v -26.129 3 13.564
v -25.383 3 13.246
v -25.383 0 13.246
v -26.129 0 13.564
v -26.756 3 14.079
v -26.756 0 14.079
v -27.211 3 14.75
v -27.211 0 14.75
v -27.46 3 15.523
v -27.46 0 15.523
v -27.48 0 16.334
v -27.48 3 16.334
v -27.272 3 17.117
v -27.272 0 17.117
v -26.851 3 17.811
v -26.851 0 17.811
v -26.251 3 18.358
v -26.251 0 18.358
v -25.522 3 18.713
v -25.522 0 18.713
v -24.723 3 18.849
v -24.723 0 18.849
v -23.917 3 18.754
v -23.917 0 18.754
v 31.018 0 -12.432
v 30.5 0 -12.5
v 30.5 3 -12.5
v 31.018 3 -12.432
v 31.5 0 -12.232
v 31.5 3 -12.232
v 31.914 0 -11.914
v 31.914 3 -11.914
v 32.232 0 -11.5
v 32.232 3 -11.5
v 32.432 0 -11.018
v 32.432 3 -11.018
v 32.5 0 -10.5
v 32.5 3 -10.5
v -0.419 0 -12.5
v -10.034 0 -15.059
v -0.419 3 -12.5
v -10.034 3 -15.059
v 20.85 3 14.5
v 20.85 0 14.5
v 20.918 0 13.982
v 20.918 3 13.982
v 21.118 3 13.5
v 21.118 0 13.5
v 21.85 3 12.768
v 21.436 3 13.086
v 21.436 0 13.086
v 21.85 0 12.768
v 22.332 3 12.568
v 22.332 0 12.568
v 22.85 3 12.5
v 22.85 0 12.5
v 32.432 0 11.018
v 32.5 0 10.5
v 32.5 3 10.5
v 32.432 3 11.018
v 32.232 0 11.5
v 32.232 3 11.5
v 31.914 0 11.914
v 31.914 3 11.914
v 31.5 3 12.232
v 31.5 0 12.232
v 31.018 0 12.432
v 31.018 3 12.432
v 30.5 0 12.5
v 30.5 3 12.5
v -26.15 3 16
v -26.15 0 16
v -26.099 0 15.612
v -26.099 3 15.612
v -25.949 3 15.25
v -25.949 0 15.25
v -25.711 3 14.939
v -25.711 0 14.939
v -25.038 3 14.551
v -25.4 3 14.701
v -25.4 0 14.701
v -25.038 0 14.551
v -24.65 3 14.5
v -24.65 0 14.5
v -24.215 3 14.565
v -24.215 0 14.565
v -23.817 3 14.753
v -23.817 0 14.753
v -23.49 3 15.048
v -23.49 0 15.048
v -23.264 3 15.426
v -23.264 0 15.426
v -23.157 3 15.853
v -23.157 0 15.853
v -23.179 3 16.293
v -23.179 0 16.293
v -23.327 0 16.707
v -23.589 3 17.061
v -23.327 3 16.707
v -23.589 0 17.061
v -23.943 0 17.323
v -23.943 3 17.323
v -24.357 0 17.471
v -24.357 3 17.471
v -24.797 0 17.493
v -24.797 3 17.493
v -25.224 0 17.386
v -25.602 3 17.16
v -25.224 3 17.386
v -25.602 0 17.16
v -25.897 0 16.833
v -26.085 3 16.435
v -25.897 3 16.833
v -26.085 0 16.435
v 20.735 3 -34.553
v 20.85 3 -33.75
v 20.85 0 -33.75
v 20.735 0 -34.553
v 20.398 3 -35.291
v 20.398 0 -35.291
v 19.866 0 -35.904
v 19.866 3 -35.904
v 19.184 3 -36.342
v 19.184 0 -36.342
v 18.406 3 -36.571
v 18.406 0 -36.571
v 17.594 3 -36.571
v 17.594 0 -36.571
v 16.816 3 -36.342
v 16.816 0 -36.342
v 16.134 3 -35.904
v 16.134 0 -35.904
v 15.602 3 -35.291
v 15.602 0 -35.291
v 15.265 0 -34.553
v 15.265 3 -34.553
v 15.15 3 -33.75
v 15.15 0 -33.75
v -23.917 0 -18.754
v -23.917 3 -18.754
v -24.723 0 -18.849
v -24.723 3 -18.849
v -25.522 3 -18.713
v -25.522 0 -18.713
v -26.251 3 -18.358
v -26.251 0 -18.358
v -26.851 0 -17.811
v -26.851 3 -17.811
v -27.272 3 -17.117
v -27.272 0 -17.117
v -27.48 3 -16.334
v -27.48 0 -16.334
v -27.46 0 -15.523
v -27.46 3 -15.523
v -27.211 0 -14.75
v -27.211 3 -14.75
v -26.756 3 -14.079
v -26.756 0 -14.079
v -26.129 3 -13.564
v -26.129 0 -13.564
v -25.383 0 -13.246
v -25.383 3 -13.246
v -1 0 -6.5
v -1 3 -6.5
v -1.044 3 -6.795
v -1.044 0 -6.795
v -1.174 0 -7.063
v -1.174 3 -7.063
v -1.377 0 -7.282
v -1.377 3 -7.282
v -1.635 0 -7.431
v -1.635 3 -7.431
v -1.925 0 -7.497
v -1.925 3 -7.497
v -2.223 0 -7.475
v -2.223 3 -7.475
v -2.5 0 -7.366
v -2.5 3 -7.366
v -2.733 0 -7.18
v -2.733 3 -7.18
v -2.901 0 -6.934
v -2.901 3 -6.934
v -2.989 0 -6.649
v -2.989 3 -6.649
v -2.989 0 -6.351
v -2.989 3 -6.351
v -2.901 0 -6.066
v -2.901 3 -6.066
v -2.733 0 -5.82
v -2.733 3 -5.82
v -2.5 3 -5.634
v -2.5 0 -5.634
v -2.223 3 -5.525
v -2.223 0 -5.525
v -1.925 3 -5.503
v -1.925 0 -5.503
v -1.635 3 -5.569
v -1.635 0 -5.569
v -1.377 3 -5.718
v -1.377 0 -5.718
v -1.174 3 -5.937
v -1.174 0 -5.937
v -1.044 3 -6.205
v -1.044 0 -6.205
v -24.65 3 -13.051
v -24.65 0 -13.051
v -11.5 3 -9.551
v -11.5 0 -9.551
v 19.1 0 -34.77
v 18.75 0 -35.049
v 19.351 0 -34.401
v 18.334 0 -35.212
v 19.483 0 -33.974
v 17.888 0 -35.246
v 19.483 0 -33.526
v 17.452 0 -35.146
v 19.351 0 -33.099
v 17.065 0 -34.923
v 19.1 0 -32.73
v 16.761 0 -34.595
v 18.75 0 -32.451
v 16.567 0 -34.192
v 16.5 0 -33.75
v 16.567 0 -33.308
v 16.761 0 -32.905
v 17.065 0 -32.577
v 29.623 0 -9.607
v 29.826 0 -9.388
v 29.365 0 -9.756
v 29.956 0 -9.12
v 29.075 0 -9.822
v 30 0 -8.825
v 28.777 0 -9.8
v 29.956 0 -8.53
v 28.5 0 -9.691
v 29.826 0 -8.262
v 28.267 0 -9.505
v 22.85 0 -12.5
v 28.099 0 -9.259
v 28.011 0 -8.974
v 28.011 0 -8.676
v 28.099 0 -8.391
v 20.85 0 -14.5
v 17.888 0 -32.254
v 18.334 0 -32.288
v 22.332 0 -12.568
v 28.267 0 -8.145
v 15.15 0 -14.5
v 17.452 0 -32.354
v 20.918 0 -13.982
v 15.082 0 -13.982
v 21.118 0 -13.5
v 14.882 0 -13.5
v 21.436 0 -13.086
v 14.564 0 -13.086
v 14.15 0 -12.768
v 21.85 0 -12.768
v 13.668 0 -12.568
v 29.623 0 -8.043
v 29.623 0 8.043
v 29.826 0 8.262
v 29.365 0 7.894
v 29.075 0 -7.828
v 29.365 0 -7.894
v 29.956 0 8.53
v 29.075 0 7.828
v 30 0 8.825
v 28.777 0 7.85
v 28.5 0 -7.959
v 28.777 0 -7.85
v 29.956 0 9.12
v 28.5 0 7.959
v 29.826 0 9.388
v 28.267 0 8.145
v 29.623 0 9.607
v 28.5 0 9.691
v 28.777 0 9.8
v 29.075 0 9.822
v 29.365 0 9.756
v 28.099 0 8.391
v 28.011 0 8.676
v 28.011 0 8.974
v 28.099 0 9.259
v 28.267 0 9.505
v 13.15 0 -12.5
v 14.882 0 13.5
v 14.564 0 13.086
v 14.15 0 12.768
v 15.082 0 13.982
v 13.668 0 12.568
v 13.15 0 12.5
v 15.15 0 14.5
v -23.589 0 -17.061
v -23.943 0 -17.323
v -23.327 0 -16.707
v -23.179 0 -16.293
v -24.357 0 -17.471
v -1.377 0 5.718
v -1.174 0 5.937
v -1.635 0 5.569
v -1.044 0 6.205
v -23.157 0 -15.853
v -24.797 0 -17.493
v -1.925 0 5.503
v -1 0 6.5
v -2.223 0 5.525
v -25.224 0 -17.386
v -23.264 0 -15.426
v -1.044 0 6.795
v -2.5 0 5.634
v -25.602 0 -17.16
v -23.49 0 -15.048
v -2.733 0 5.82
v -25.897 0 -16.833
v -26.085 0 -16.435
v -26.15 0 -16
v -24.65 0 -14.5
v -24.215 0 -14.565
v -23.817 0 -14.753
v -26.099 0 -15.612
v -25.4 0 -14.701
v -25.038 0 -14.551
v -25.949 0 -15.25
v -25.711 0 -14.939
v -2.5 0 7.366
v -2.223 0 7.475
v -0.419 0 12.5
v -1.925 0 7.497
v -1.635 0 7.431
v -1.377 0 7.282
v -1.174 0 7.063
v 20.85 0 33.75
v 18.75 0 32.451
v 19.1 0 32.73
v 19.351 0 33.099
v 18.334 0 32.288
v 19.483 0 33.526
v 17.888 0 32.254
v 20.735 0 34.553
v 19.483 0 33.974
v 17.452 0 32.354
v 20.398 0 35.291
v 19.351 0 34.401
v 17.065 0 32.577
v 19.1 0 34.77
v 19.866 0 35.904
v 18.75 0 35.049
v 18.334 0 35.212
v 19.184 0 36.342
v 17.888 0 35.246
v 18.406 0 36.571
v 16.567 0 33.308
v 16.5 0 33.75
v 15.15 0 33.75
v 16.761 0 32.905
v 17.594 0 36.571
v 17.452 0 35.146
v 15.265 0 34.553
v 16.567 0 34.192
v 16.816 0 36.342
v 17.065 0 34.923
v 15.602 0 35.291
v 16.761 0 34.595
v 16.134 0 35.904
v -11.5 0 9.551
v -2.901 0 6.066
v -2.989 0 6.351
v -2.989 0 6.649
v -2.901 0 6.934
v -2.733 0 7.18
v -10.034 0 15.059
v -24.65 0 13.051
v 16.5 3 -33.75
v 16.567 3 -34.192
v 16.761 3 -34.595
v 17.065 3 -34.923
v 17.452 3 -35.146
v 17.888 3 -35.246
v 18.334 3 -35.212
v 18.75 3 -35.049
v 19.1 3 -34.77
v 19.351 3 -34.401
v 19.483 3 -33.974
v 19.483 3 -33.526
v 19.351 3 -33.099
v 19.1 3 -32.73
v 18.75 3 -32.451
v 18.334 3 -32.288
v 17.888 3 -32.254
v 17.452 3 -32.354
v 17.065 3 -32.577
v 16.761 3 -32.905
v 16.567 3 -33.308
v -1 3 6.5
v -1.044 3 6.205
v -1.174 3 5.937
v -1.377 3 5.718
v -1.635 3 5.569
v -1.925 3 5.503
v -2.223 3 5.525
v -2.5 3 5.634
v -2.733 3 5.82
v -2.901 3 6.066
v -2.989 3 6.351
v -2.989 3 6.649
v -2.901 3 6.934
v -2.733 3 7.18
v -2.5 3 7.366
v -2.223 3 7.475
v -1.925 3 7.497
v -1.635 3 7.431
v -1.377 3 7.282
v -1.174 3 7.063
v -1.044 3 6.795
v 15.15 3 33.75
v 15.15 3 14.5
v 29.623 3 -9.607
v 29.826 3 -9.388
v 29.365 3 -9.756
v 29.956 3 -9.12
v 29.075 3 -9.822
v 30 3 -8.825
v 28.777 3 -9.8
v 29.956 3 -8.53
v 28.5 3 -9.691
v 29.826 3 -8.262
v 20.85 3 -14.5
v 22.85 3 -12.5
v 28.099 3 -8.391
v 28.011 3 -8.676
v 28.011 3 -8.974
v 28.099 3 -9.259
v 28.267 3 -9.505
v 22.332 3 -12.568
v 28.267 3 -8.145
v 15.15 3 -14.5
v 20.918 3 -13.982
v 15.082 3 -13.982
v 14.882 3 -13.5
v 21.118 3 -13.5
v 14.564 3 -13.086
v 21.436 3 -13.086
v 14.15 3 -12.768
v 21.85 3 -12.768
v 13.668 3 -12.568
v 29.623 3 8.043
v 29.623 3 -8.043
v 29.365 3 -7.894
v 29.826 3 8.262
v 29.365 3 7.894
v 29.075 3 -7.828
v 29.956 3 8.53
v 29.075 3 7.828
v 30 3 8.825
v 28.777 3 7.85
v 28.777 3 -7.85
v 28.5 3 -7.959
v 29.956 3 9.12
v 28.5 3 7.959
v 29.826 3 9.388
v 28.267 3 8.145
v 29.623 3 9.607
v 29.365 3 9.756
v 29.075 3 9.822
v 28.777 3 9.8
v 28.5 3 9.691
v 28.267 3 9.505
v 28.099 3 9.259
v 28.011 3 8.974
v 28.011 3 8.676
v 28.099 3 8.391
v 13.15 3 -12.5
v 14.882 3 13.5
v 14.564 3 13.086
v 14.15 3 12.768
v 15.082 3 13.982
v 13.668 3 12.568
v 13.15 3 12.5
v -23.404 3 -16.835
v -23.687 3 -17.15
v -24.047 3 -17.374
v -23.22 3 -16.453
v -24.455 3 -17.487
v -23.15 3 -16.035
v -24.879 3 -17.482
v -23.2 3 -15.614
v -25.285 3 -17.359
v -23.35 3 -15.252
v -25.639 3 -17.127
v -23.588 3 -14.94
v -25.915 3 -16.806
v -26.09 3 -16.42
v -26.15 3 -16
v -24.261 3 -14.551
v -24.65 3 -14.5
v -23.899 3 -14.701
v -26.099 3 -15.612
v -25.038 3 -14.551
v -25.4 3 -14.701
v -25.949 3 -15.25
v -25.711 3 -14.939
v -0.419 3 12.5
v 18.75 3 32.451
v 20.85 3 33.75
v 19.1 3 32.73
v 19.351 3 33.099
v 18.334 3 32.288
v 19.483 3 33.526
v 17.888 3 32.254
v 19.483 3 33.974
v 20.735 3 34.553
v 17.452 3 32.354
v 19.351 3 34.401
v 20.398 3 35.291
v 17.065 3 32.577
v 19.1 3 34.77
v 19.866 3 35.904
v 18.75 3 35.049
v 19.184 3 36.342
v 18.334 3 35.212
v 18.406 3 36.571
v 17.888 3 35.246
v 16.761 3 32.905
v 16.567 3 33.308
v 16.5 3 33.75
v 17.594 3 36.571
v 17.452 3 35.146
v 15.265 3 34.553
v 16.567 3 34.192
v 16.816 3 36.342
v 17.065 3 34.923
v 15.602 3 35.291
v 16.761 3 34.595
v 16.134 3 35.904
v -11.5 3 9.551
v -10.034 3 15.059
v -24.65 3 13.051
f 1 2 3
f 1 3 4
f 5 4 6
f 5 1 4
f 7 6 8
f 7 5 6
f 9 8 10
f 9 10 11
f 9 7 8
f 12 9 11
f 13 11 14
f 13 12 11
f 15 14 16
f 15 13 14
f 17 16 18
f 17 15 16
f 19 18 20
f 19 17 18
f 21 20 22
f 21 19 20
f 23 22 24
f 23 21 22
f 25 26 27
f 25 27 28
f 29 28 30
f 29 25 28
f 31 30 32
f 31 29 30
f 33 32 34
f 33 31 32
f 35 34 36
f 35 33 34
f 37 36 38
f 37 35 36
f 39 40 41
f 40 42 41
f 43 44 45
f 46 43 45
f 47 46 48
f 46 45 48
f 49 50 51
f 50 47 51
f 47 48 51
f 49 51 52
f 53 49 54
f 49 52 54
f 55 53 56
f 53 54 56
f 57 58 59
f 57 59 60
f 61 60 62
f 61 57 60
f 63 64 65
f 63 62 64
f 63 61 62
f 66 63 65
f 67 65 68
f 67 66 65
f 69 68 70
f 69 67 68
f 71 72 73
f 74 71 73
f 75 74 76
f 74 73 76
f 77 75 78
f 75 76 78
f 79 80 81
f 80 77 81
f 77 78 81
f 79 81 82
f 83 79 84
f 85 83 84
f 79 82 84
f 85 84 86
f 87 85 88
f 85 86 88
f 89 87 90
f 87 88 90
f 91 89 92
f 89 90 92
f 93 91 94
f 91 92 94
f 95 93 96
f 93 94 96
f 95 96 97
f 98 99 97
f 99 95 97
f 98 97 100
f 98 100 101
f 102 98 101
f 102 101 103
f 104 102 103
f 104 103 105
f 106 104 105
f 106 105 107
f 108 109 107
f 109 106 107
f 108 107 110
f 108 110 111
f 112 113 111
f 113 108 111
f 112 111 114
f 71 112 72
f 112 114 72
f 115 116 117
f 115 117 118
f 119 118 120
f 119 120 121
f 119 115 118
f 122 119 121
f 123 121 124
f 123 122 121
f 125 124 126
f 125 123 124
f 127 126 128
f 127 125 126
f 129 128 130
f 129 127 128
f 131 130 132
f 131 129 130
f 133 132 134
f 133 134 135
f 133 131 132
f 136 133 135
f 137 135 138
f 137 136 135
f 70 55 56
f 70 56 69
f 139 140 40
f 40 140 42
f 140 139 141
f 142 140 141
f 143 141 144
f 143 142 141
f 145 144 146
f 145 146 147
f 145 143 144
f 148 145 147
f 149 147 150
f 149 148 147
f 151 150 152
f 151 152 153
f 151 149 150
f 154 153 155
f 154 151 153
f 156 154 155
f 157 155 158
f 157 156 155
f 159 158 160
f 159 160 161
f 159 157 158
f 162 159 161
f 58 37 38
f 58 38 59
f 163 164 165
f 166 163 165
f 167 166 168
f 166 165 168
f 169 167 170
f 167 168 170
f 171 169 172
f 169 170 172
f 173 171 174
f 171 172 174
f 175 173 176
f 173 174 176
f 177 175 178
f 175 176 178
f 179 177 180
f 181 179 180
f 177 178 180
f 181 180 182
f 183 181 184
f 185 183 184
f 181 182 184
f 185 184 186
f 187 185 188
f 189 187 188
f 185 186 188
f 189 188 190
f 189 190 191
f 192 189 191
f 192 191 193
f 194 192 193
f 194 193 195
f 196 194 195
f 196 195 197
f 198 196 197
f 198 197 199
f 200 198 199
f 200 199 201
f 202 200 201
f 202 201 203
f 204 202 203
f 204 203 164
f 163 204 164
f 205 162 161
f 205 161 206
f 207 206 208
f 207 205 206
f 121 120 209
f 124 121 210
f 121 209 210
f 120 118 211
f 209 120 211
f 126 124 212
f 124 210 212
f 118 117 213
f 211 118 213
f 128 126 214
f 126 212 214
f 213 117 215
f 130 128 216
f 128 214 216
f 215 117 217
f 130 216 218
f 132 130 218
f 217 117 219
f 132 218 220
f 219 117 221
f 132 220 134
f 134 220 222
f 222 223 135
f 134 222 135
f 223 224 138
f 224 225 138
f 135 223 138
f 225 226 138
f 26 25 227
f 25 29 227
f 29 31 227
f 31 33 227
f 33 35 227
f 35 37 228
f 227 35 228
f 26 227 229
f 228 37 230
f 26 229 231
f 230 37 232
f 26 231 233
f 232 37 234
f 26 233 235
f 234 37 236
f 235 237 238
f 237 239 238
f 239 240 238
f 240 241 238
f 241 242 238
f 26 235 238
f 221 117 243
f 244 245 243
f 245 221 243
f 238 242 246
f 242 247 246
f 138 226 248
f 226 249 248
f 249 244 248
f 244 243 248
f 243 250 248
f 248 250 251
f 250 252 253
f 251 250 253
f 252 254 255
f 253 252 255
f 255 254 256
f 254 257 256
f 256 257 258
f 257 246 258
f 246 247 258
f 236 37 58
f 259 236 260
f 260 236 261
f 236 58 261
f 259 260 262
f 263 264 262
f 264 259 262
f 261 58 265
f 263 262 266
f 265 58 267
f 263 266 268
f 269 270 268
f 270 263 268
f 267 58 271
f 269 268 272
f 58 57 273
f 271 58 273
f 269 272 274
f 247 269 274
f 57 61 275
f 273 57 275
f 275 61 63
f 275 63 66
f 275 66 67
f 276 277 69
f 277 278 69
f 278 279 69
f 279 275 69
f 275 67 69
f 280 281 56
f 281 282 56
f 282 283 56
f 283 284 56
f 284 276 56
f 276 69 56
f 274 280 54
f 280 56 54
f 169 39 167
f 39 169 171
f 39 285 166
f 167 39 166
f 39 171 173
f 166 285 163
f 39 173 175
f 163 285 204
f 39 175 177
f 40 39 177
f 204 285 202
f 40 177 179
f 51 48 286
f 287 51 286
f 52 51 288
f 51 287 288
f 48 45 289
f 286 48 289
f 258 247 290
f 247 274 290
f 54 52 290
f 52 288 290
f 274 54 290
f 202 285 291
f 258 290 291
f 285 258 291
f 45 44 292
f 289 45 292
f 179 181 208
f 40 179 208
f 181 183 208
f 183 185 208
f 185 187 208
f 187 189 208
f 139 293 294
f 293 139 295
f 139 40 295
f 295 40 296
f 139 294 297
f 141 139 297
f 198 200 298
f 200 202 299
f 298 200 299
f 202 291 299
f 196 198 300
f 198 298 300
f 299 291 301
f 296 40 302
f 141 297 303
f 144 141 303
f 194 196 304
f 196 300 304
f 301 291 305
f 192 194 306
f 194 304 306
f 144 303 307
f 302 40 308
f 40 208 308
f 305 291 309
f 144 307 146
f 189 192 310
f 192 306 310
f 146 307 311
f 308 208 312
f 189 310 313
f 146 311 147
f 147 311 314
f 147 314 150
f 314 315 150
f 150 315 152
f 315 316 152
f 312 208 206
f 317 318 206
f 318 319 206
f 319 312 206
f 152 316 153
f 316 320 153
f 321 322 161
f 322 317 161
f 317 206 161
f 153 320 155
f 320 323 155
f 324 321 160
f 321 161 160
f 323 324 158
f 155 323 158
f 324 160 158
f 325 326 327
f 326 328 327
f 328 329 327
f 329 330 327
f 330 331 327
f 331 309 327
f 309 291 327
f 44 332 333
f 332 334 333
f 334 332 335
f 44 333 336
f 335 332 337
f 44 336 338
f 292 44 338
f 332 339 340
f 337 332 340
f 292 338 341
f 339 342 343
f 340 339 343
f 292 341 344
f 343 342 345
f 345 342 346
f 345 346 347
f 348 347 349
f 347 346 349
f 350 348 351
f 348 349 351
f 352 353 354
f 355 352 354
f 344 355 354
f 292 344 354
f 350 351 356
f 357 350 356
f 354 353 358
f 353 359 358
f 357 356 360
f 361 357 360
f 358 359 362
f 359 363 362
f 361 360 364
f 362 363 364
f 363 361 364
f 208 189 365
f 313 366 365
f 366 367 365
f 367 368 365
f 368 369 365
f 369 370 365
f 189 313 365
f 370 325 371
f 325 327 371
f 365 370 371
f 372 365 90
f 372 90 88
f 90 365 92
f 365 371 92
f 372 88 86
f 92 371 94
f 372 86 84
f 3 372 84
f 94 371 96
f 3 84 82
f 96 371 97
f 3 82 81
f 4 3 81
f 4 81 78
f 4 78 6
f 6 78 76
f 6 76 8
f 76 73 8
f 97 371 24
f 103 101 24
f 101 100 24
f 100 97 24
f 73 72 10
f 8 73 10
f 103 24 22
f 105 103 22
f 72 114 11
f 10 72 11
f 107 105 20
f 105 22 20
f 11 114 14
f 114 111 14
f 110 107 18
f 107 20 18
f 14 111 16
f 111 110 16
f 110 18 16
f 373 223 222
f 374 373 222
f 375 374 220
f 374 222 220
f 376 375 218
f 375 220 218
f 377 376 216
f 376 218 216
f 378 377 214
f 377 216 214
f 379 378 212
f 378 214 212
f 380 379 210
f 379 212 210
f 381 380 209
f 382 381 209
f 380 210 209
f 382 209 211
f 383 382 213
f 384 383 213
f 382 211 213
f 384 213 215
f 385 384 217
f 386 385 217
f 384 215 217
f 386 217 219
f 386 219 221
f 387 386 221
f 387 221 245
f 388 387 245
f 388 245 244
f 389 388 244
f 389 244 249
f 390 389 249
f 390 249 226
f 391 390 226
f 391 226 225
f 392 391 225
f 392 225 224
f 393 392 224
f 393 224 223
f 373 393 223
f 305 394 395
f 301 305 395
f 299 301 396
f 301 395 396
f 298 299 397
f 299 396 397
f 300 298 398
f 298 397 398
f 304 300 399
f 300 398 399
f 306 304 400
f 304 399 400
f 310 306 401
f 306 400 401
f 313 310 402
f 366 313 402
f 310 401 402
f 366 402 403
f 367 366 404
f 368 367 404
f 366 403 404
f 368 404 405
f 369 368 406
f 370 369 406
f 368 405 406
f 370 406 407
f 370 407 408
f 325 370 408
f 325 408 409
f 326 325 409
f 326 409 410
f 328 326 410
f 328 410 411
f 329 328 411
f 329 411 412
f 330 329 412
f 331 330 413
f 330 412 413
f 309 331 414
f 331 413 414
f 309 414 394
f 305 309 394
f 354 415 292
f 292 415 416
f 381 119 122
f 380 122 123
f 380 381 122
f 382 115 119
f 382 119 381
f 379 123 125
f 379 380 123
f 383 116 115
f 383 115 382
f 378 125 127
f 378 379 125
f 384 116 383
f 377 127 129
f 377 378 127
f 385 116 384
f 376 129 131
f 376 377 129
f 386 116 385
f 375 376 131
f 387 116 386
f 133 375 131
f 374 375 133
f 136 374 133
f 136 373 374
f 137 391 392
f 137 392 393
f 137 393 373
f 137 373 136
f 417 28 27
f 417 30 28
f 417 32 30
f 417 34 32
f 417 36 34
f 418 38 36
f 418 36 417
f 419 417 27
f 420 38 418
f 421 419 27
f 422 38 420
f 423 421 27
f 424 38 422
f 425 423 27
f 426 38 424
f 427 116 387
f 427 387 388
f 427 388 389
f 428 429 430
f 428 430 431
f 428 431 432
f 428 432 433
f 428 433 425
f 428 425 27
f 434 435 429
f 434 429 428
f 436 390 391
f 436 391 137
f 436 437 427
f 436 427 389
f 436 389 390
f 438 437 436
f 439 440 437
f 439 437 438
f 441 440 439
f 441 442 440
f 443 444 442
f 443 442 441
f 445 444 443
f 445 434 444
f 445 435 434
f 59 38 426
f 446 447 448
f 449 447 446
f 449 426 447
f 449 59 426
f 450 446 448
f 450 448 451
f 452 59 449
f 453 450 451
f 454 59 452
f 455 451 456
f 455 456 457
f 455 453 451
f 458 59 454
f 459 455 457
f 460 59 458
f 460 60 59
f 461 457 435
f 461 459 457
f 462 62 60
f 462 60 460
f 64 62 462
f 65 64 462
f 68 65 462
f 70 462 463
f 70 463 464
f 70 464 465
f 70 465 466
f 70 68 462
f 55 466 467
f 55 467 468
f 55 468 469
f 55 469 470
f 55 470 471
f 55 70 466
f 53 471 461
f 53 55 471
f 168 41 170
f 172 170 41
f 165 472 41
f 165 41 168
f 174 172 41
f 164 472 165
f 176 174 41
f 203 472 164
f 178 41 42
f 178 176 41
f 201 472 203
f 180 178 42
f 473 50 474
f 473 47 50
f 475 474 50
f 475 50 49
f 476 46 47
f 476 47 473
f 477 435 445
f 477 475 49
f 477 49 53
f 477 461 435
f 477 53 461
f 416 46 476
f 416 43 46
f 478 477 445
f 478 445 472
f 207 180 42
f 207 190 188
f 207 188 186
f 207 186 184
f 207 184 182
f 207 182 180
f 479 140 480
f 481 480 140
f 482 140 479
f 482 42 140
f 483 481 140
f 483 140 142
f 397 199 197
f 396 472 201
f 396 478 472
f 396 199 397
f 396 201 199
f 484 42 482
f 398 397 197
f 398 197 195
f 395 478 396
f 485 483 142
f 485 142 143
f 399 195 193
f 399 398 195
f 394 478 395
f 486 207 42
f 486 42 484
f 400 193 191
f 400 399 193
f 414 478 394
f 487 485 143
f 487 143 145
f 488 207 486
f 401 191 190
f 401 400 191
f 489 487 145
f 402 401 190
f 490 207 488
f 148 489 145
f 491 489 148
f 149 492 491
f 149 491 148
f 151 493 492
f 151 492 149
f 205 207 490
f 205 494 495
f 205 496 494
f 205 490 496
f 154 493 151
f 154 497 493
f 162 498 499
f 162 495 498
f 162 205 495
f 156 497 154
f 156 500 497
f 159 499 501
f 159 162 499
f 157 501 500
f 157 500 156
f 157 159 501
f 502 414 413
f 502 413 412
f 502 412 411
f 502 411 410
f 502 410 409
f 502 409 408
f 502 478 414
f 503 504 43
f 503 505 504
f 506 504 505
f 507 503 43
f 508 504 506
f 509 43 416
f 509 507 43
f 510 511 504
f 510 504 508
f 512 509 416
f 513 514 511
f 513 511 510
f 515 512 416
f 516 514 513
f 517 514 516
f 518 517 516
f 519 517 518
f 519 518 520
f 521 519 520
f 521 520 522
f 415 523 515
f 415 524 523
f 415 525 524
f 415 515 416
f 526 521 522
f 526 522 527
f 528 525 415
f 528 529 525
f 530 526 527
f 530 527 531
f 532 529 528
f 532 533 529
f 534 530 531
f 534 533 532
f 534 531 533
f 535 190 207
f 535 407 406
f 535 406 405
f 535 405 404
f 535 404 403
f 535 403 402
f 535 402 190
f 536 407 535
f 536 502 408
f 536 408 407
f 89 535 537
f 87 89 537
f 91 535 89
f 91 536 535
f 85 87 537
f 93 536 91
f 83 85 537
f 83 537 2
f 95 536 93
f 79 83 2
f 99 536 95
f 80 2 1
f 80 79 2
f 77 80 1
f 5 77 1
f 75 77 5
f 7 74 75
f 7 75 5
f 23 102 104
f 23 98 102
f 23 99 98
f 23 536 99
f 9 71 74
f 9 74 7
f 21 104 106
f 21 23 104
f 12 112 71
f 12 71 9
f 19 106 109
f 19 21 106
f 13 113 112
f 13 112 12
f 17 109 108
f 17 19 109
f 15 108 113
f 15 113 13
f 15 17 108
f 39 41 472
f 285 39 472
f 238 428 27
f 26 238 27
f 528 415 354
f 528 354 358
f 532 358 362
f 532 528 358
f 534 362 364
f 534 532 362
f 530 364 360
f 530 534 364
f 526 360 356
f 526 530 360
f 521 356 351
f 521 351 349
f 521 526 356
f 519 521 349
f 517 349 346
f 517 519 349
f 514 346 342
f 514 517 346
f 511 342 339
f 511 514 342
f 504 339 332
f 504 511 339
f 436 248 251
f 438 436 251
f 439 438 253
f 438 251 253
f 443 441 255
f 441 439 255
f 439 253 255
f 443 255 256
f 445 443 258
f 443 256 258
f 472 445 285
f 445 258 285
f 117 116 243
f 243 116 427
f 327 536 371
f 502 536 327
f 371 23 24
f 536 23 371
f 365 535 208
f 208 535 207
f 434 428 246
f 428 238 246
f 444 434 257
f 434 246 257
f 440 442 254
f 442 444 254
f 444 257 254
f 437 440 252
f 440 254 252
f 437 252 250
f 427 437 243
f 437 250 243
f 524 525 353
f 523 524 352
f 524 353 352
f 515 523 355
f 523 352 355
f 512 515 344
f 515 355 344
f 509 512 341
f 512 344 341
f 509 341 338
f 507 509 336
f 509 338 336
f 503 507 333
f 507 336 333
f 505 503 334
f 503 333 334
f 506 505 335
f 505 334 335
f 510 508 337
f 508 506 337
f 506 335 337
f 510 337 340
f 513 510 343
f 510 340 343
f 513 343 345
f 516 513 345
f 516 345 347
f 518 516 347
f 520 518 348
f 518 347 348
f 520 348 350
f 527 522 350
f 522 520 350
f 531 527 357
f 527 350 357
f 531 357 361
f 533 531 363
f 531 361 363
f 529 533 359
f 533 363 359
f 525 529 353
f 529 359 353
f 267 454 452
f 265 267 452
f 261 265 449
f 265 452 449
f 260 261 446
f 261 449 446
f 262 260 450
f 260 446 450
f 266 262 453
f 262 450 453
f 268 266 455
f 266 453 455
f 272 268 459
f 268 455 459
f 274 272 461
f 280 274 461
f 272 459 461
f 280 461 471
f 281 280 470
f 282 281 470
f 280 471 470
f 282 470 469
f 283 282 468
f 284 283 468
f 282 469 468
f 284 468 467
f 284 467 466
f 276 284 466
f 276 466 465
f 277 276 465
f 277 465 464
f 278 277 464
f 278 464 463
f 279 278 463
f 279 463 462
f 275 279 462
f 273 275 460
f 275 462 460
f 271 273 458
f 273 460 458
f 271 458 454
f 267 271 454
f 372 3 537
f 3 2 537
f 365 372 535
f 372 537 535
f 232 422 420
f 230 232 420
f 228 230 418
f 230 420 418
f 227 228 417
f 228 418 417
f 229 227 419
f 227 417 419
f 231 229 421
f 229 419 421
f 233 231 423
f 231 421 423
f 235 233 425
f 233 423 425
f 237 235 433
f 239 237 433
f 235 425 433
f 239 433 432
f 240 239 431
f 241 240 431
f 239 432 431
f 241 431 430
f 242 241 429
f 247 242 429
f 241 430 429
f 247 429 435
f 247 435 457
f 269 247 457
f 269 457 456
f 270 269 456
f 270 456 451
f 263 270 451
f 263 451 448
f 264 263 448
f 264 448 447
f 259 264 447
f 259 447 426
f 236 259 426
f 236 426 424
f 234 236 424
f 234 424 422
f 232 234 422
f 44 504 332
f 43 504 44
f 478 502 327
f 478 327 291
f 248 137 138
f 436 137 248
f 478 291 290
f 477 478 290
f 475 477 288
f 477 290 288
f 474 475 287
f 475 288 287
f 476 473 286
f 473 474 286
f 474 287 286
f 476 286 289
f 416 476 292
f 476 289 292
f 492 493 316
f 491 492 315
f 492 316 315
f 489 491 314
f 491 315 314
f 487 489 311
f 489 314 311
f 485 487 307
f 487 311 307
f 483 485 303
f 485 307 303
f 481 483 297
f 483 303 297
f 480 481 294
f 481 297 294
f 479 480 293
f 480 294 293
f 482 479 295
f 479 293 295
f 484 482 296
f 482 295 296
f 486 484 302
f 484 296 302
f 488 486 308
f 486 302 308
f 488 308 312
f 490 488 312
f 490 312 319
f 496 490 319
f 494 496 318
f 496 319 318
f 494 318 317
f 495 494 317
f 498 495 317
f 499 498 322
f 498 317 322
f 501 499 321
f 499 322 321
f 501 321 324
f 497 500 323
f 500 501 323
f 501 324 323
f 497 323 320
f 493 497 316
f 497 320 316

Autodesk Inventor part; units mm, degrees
ref_plane "YZ Plane" through (0, 0, 0) normal (1, 0, 0) x (0, 1, 0)
ref_plane "XZ Plane" through (0, 0, 0) normal (0, 1, 0) x (-1, 0, 0)
sketch "Sketch1" plane through (0, 0, 0) normal (0, 1, 0) x (-1, 0, 0)
  line L0 (-29, 33.75) -> (29, 33.75)
  line L1 (29, 33.75) -> (29, -33.75)
  line L2 (29, -33.75) -> (-29, -33.75)
  line L3 (-29, -33.75) -> (-29, 33.75)
  line L4 (-29, 33.75) -> (29, -33.75) construction
  line L5 (29, 33.75) -> (-29, -33.75) construction
  line L6 (-32.5, 37.25) -> (32.5, 37.25)
  line L7 (32.5, -37.25) -> (-32.5, -37.25)
  line L8 (-32.5, -37.25) -> (-32.5, 37.25)
  line L9 (-32.5, 37.25) -> (32.5, -37.25) construction
  line L10 (32.5, 37.25) -> (-32.5, -37.25) construction
  line L11 (32.5, 37.25) -> (32.5, 5.9791)
  line L12 (32.5, -5.9791) -> (32.5, -37.25)
  line L13 (24.65, -1.5966) -> (24.65, -16)
  circle A0 centre (24.65, -16) radius 1.5
  arc A1 (32.5, 5.9791) -> (32.5, -5.9791) centre (33, 0) ccw
  line L14 (32.5, -5.9791) -> (32.5, 5.9791)
  line L15 (33, 0) -> (-32.5, 0)
  line L16 (24.65, -1.5966) -> (24.65, 16)
  circle A2 centre (24.65, 16) radius 1.5
  circle A3 centre (-18, -33.75) radius 1.5
  circle A4 centre (-18, 33.75) radius 1.5
  point P0 (0, 0)
  dimension "d1" = 58
  dimension "d3" = 3.5
  dimension "d31" = 67.5
  dimension "d32" = 3.5
  dimension "d34" = 3
  dimension "d57" = 47
  dimension "d61" = 42.65
  dimension "d62" = 16
ref_plane "Work Plane1" through (0, 3, 0) normal (0, 1, 0) x (1, 0, 0)
extrude "Extrusion4" add sketch "Sketch1" along normal blind 3 contours A4 L0 L3 L15 L8 L6 L11 A1 L1 | L0 L1 A1 L15 L3 A4 | A1 L1 L2 A3 L3 L15 | L3 L2 A3 L1 A1 L12 L7 L8 L15
sketch "Sketch3" plane through (0, 3, 0) normal (0, 1, 0) x (1, 0, 0)
  circle A0 centre (-24.65, 16) radius 1.5 projected
  circle A1 centre (-24.65, 16) radius 2.85
  circle A2 centre (18, 33.75) radius 1.5
  line L0 (32.5, -37.25) -> (32.5, 37.25) projected
  line L1 (32.5, 0) -> (-11.5, 0)
  line L2 (-11.5, 0) -> (-11.5, 12.5)
  line L3 (-11.5, 12.5) -> (32.5, 12.5)
  line L4 (32.5, 12.5) -> (32.5, 0)
  line L5 (32.5, 0) -> (32.5, 12.5)
  line L6 (32.5, 0) -> (29, 0)
  line L7 (29, 0) -> (29, 8.825)
  line L8 (29, 8.825) -> (-2, 8.825)
  line L9 (-2, 8.825) -> (-2, 0)
  circle A3 centre (29, 8.825) radius 1
  line L10 (-11.5, 0) -> (-11.5, -12.5)
  line L11 (-11.5, -12.5) -> (32.5, -12.5)
  line L12 (32.5, -12.5) -> (32.5, 0)
  line L13 (29, 0) -> (29, -8.825)
  line L14 (29, -8.825) -> (-2, -8.825)
  line L15 (-2, -8.825) -> (-2, 0)
  circle A4 centre (29, -8.825) radius 1
  line L16 (32.5, 26) -> (32.5, 12.5)
  line L17 (-24.65, 16) -> (-11.5, 12.5)
  line L18 (-25.383, 13.2459) -> (-11.5, 9.5508)
  line L19 (-23.917, 18.7541) -> (-10.0339, 15.059)
  line L20 (32.5, 26) -> (32.5, 12.5)
  line L21 (-10.0339, 15.059) -> (-0.4194, 12.5)
  circle A5 centre (-24.65, -16) radius 2.85
  line L22 (-24.65, -16) -> (-11.5, -12.5)
  line L23 (-25.383, -13.2459) -> (-11.5, -9.5508)
  line L24 (-23.917, -18.7541) -> (-10.0339, -15.059)
  line L25 (-10.0339, -15.059) -> (-0.4194, -12.5)
  circle A6 centre (18, 33.75) radius 2.85
  line L26 (32.5, 12.5) -> (15.5, 12.5)
  circle A7 centre (-2, 6.5) radius 1
  circle A8 centre (-2, -6.5) radius 1
  circle A9 centre (18, 33.75) radius 1.5 projected
  circle A10 centre (18, -33.75) radius 1.5
  circle A11 centre (18, -33.75) radius 2.85
  circle A12 centre (18, -33.75) radius 1.5
  line L27 (20.85, 33.75) -> (20.85, 12.5)
  line L28 (15.15, 33.75) -> (15.15, 12.5)
  line L29 (20.85, -33.75) -> (20.85, -12.5)
  line L30 (15.15, -33.75) -> (15.15, -12.5)
  point P0 (0, 0)
  point P1 (-23.917, 18.7541)
  point P2 (-11.5, -9.5508)
  point P3 (-23.917, -18.7541)
  point P4 (-0.4194, -12.5)
  point P5 (32.5, -12.5)
  point P6 (15.15, -12.5)
  point P7 (20.85, -33.75)
  point P8 (20.85, -12.5)
  point P9 (15.15, 12.5)
  point P10 (20.85, 12.5)
  dimension "d37" = 5.7
  dimension "d38" = 44
  dimension "d39" = 12.5
  dimension "d40" = 3.5
  dimension "d41" = 8.825
  dimension "d42" = 31
  dimension "d44" = 2
  dimension "d48" = 5.7
  dimension "d49" = 17
  dimension "d56" = 6.5
extrude "Extrusion6" cut sketch "Sketch3" against normal blind 44 contours A0 | A1 | A1 L19 L21 L3 L17 | L17 L2 L18 A1 | L3 L0 L1 L7 A3 L8 L9 A7 L2 | L1 L15 A8 L14 A4 L13 L0 L11 L10 | L28 A6 L27 L3 | L9 A7 L8 A3 L7 L1 | L1 L13 A4 L14 L15 A8 | L10 L22 A5 L23 | A6 | L11 L25 L24 A5 L22 | A5 | L11 L29 A11 L30 | A11 | A2 | A10 keep common part
fillet "Fillet3" radius 2 6 edges at (32.5, 1.5, 12.5) (32.5, 1.5, -12.5) (20.85, 1.5, 12.5) (15.15, 1.5, 12.5) (20.85, 1.5, -12.5) (15.15, 1.5, -12.5)
equation "\"d53\" = d38"
properties part number "base_c"
